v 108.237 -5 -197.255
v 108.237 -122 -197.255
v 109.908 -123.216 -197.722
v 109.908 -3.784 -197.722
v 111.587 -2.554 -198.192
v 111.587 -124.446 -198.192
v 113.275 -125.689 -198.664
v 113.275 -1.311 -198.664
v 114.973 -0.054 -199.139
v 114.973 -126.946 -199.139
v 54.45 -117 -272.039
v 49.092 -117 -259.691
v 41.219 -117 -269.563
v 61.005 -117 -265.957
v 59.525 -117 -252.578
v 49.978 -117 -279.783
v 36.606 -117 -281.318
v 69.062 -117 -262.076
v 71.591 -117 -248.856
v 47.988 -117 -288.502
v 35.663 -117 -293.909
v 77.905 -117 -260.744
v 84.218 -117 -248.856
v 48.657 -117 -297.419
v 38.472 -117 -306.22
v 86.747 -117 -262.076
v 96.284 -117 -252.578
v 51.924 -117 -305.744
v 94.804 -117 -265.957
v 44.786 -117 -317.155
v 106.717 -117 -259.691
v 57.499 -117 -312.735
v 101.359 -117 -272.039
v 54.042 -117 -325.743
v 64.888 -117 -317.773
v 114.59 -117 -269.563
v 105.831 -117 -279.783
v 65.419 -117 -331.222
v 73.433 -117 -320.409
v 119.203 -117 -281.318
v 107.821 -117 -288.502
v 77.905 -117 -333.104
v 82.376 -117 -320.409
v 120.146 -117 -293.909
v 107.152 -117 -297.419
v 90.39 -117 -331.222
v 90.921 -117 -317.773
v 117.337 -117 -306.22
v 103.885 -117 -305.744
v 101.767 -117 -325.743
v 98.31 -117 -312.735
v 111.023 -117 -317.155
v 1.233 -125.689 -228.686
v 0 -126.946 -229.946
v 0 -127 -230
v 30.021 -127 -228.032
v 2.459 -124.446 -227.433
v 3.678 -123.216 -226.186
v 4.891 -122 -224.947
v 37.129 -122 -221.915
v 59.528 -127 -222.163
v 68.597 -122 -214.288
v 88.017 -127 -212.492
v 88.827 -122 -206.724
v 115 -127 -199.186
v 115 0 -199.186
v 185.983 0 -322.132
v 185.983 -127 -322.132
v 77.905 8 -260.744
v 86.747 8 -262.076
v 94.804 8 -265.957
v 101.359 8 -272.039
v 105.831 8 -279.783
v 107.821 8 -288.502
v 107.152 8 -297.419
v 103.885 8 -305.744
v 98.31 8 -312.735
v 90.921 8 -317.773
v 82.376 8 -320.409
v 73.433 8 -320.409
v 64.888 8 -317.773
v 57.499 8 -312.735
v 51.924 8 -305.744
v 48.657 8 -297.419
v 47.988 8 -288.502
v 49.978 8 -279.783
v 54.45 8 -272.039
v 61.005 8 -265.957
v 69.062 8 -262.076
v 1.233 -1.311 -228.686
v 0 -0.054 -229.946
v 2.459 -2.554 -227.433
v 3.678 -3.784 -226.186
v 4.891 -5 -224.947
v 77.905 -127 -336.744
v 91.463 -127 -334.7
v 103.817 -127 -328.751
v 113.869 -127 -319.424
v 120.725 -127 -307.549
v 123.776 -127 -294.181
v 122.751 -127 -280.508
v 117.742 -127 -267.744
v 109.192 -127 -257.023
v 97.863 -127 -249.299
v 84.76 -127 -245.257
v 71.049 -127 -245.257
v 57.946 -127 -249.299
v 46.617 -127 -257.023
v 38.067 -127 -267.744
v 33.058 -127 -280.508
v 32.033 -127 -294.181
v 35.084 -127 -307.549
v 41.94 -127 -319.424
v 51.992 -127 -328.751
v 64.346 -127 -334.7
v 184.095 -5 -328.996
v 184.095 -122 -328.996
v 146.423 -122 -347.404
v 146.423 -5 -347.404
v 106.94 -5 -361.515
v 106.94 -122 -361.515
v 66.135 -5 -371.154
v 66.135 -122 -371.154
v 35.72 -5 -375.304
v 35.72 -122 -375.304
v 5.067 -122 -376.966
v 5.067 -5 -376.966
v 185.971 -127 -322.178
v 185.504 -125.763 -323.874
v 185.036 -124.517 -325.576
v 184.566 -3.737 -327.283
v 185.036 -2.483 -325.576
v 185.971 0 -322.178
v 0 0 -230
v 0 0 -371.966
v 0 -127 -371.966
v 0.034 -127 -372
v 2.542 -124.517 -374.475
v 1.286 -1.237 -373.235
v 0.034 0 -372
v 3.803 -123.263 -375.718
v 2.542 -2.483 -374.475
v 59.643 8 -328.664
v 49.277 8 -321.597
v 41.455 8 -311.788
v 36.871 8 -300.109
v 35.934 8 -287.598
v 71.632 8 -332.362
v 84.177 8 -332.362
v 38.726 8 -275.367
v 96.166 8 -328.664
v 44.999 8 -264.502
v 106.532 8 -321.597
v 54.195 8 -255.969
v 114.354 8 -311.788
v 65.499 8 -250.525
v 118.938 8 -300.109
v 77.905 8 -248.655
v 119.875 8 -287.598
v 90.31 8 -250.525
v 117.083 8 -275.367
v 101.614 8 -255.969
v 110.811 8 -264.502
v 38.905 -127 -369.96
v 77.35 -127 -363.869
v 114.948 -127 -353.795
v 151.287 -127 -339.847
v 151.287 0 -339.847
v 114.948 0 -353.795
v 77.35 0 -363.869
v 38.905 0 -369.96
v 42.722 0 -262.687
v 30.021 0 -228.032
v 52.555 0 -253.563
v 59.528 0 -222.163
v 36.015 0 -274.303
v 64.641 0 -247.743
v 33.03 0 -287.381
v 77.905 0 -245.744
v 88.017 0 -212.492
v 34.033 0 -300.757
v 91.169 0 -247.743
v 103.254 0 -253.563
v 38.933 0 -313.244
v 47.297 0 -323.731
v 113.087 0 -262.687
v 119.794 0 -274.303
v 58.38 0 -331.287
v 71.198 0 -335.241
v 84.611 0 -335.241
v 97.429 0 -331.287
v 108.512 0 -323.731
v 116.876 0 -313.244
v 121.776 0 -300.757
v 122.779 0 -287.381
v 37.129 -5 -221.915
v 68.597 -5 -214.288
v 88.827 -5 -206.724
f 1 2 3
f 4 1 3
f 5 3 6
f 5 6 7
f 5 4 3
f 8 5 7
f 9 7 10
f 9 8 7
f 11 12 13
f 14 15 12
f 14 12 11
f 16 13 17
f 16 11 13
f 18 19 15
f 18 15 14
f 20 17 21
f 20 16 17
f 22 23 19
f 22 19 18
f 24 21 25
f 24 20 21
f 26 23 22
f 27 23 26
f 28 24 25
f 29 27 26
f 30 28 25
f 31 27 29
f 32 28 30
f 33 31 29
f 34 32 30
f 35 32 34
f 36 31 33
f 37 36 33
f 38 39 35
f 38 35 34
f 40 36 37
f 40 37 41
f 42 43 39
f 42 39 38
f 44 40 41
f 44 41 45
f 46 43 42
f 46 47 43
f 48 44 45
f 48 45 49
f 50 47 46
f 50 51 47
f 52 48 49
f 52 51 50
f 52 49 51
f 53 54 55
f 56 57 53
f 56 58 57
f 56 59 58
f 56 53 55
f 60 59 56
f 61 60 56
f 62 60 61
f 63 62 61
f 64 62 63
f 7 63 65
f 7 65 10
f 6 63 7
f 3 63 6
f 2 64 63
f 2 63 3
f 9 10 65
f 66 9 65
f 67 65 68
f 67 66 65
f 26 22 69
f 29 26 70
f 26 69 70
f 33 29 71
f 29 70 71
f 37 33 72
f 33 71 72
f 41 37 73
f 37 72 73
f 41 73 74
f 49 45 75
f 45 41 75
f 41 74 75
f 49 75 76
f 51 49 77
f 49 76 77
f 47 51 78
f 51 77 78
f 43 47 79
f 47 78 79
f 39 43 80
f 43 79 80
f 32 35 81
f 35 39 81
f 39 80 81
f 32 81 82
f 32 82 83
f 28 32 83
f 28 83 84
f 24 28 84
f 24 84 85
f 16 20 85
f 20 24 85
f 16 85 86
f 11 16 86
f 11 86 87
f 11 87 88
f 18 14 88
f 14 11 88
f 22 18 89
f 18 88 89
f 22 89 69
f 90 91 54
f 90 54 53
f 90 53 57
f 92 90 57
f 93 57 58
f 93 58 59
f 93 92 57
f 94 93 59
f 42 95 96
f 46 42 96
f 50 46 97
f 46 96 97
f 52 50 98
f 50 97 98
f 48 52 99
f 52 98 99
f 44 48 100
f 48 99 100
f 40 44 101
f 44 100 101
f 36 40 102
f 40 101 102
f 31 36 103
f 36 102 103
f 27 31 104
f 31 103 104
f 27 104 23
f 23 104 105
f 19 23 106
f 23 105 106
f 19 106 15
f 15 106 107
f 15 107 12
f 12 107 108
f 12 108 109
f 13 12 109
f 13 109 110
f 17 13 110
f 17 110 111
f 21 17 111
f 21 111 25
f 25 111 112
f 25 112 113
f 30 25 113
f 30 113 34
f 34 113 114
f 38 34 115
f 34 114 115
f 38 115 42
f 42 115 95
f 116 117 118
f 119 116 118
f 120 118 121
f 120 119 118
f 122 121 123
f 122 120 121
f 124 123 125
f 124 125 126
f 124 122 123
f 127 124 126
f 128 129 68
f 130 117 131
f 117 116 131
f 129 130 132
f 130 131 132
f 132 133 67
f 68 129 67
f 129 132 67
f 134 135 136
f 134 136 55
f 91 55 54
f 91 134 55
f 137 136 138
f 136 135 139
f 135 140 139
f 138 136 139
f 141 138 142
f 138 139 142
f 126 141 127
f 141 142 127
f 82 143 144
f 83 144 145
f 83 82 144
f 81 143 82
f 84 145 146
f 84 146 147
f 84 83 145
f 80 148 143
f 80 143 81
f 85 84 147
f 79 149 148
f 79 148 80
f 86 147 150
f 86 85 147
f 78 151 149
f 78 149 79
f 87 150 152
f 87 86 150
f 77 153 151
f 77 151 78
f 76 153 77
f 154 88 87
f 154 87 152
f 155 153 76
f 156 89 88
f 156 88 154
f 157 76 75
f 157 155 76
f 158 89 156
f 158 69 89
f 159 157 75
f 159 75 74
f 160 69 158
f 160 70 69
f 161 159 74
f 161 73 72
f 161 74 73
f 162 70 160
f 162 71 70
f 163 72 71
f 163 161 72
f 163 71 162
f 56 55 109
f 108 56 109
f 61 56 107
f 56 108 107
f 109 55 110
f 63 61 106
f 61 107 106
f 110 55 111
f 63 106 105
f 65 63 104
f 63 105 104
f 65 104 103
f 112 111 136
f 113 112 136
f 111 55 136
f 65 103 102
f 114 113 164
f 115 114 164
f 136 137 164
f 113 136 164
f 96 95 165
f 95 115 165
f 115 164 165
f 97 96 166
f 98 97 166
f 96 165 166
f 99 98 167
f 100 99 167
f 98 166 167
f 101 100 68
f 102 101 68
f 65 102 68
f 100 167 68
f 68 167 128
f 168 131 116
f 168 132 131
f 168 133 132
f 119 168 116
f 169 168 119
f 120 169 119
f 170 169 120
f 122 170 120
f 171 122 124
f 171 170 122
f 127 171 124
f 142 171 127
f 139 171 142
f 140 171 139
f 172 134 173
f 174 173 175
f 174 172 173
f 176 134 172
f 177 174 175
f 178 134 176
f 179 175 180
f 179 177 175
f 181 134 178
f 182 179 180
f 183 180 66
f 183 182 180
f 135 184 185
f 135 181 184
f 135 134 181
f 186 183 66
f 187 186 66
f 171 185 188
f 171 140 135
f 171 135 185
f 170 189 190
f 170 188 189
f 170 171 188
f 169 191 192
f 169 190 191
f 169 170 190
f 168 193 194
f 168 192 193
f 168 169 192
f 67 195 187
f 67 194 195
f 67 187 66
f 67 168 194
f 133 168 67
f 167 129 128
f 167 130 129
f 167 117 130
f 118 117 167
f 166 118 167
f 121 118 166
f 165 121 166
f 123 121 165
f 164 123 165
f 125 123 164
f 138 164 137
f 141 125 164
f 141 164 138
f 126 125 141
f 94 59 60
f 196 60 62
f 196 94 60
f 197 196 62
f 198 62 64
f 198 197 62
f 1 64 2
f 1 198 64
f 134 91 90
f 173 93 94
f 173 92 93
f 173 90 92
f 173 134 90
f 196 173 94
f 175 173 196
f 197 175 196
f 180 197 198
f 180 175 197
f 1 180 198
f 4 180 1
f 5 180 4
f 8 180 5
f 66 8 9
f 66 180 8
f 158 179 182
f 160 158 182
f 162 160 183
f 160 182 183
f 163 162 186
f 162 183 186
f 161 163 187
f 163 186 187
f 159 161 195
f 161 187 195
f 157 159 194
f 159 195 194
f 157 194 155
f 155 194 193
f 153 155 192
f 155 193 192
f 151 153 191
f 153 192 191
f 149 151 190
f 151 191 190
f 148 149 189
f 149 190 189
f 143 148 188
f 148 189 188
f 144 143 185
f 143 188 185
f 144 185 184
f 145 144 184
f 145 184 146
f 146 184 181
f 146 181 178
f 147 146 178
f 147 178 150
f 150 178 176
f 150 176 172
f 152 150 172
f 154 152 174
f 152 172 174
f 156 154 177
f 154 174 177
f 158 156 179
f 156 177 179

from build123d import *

# Parameters (mm, degrees)
SKETCH1_R           = 30
BOSS_EXTRUDE1_DEPTH = 127
BOSS_EXTRUDE2_START = 8
SKETCH3_R           = 45
SKETCH3_R_2         = 30
BOSS_EXTRUDE2_DEPTH = 8
CHAMFER1_SIZE2      = 8
CHAMFER1_SIZE       = 2.911761874
CUT_EXTRUDE1_START  = -10
SKETCH4_R           = 46
SKETCH4_R_2         = 30
CUT_EXTRUDE1_DEPTH  = 10
CHAMFER2_SIZE2      = 10
CHAMFER2_SIZE       = 3.639702343


# Some blends are built 0.0001 mm under size
with BuildPart() as part:
    # Sketch1 → Boss-Extrude1 (new body)
    with BuildSketch(Plane(origin=(0, 0, 0), x_dir=(1, 0, 0), z_dir=(0, 1, 0))):
        with BuildLine():
            Line((112.5, 194.855715851), (188.5, 326.491577227))
            ThreePointArc((188.5, 326.491577227), (97.574780004, 364.154036511), (0, 377))
            Line((0, 377), (0, 225))
            ThreePointArc((0, 225), (58.234285148, 217.333310915), (112.5, 194.855715851))
        make_face()
        with Locations(Location((77.904532576, 290.743673713, 0), (0, 0, 270))):
            Circle(SKETCH1_R, mode=Mode.SUBTRACT)
    extrude(amount=-BOSS_EXTRUDE1_DEPTH)

    # Sketch3 → Boss-Extrude2 (add)
    with BuildSketch(Plane(origin=(0, 0, 0), x_dir=(1, 0, 0), z_dir=(0, 1, 0)).offset(BOSS_EXTRUDE2_START)):
        with Locations(Location((77.904532576, 290.743673713, 0), (0, 0, 270))):
            Circle(SKETCH3_R)
        with Locations(Location((77.904532576, 290.743673713, 0), (0, 0, 270))):
            Circle(SKETCH3_R_2, mode=Mode.SUBTRACT)
    extrude(amount=-BOSS_EXTRUDE2_DEPTH)

    # Chamfer1
    chamfer1_edges = [part.edges().sort_by_distance(p)[0] for p in [
        (77.904532576, 8, -335.743673713),
    ]]
    chamfer1_side = [part.faces().sort_by_distance(p)[0] for p in [
        (77.904532576, 8, -335.685438476),
    ]]
    chamfer(chamfer1_edges, length=CHAMFER1_SIZE - 0.0001, length2=CHAMFER1_SIZE2 - 0.0001, reference=chamfer1_side[0])  # a hair under: the kernel refuses the full size

    # Sketch4 → Cut-Extrude1 (cut)
    with BuildSketch(Plane.XZ.offset(127).offset(CUT_EXTRUDE1_START)):
        with Locations(Location((77.904532576, -290.743673713, 0), (0, 0, 270))):
            Circle(SKETCH4_R)
        with Locations(Location((77.904532576, -290.743673713, 0), (0, 0, 90))):
            Circle(SKETCH4_R_2, mode=Mode.SUBTRACT)
    extrude(amount=CUT_EXTRUDE1_DEPTH, mode=Mode.SUBTRACT)

    # Chamfer2
    chamfer2_edges = [part.edges().sort_by_distance(p)[0] for p in [
        (77.904532576, -117, -244.743673713),
    ]]
    chamfer2_side = [part.faces().sort_by_distance(p)[0] for p in [
        (77.904532576, -117, -244.81646776),
    ]]
    chamfer(chamfer2_edges, length=CHAMFER2_SIZE - 0.0001, length2=CHAMFER2_SIZE2 - 0.0001, reference=chamfer2_side[0])  # a hair under: the kernel refuses the full size

    # Chamfer3
    # the kernel refuses this chamfer: 5 mm, written as the material it takes off along each edge
    with BuildSketch(Plane(origin=(0, -127, 0), x_dir=(0.5292424705918727, 0, -0.8484706284379036), z_dir=(0.8484706284379036, 0, 0.5292424705918727))) as chamfer3_piece_1:
        with BuildLine():
            Line((371.858578644, -0.141421356), (377.141421356, 5.141421356))
            Line((377.141421356, 5.141421356), (377.241421356, 5.141421356))
            ThreePointArc((377.241421356, 5.141421356), (377.1, 2.570710678), (377.1, 0))
            Line((377.1, 0), (377, -0.1))
            ThreePointArc((377, -0.1), (374.429289322, -0.1), (371.858578644, -0.241421356))
            Line((371.858578644, -0.241421356), (371.858578644, -0.141421356))
        make_face()
    revolve(axis=Axis((0, -127, 0), (0, 1, 0)), revolution_arc=33.908571791, mode=Mode.SUBTRACT)
    with BuildSketch(Plane(origin=(0, -127, 0), x_dir=(-0.05711995451760951, 0, -0.9983673225801746), z_dir=(-0.9983673225801746, 0, 0.05711995451760951))) as chamfer3_piece_2:
        with BuildLine():
            Line((230.141421356, 0.141421356), (224.858578644, -5.141421356))
            Line((224.858578644, -5.141421356), (224.758578644, -5.141421356))
            ThreePointArc((224.758578644, -5.141421356), (224.9, -2.570710678), (224.9, 0))
            Line((224.9, 0), (225, 0.1))
            ThreePointArc((225, 0.1), (227.570710678, 0.1), (230.141421356, 0.241421356))
            Line((230.141421356, 0.241421356), (230.141421356, 0.141421356))
        make_face()
    revolve(axis=Axis((0, -127, 0), (0, -1, 0)), revolution_arc=36.549029178, mode=Mode.SUBTRACT)
    with BuildSketch(Plane(origin=(0, 0, 0), x_dir=(0.5292424705918727, 0, -0.8484706284379036), z_dir=(0.8484706284379036, 0, 0.5292424705918727))) as chamfer3_piece_3:
        with BuildLine():
            Line((377.141421356, -5.141421356), (371.858578644, 0.141421356))
            Line((371.858578644, 0.141421356), (371.858578644, 0.241421356))
            ThreePointArc((371.858578644, 0.241421356), (374.429289322, 0.1), (377, 0.1))
            Line((377, 0.1), (377.1, 0))
            ThreePointArc((377.1, 0), (377.1, -2.570710678), (377.241421356, -5.141421356))
            Line((377.241421356, -5.141421356), (377.141421356, -5.141421356))
        make_face()
    revolve(axis=Axis((0, 0, 0), (0, 1, 0)), revolution_arc=33.908571791, mode=Mode.SUBTRACT)
    with BuildSketch(Plane(origin=(0, 0, 0), x_dir=(-0.05711995451760943, 0, -0.9983673225801746), z_dir=(-0.9983673225801746, 0, 0.05711995451760943))) as chamfer3_piece_4:
        with BuildLine():
            Line((224.858578644, 5.141421356), (230.141421356, -0.141421356))
            Line((230.141421356, -0.141421356), (230.141421356, -0.241421356))
            ThreePointArc((230.141421356, -0.241421356), (227.570710678, -0.1), (225, -0.1))
            Line((225, -0.1), (224.9, 0))
            ThreePointArc((224.9, 0), (224.9, 2.570710678), (224.758578644, 5.141421356))
            Line((224.758578644, 5.141421356), (224.858578644, 5.141421356))
        make_face()
    revolve(axis=Axis((0, 0, 0), (0, -1, 0)), revolution_arc=36.549029178, mode=Mode.SUBTRACT)
    with BuildSketch(Plane(origin=(0, 12.726295315, -225), x_dir=(-0.027477698296736765, 0, -0.9996224167636066), z_dir=(0, -1, 0))) as chamfer3_piece_5:
        with BuildLine():
            Line((5.090518126, 0), (-0.33429411, 5.023891374))
            Line((-0.33429411, 5.023891374), (-0.434172994, 5.018971161))
            ThreePointArc((-0.434172994, 5.018971161), (-0.183141977, 2.511326919), (-0.099962242, -0.00274777))
            Line((-0.099962242, -0.00274777), (0.00274777, -0.099962242))
            ThreePointArc((0.00274777, -0.099962242), (2.546085101, -0.030050788), (5.093265896, -0.099962242))
            Line((5.093265896, -0.099962242), (5.090518126, 0))
        make_face()
    extrude(amount=152.452590629, mode=Mode.SUBTRACT)
    with BuildSketch(Plane(origin=(0, 13.026648977, -377), x_dir=(-0.0275053668618043, 0, 0.9996216558247413), z_dir=(0, -1, 0))) as chamfer3_piece_6:
        with BuildLine():
            Line((5.176029718, 0), (-0.249663351, -5.204674974))
            Line((-0.249663351, -5.204674974), (-0.349653457, -5.203268263))
            ThreePointArc((-0.349653457, -5.203268263), (-0.162620276, -2.601558906), (-0.099962166, 0.002750537))
            Line((-0.099962166, 0.002750537), (0.002750537, 0.099962166))
            ThreePointArc((0.002750537, 0.099962166), (2.588807445, 0.0288048), (5.178780254, 0.099962166))
            Line((5.178780254, 0.099962166), (5.176029718, 0))
        make_face()
    extrude(amount=153.053297954, mode=Mode.SUBTRACT)
    with BuildSketch(Plane(origin=(188.5, 13.026648977, -326.491577227), x_dir=(-0.8556337629027079, 0, -0.5175817459889334), z_dir=(0, -1, 0))) as chamfer3_piece_7:
        with BuildLine():
            Line((5.210659591, 0), (-0.248004097, -5.170084874))
            Line((-0.248004097, -5.170084874), (-0.347983242, -5.168042668))
            ThreePointArc((-0.347983242, -5.168042668), (-0.152811741, -2.584453961), (-0.099979145, 0.002042206))
            Line((-0.099979145, 0.002042206), (0.002042206, 0.099979145))
            ThreePointArc((0.002042206, 0.099979145), (2.60636271, 0.037782504), (5.214045418, 0.099942664))
            Line((5.214045418, 0.099942664), (5.210659591, 0))
        make_face()
    extrude(amount=153.053297954, mode=Mode.SUBTRACT)
    with BuildSketch(Plane(origin=(112.5, 12.726295315, -194.855715851), x_dir=(-0.8848441204167522, 0, -0.46588719939906503), z_dir=(0, -1, 0))) as chamfer3_piece_8:
        with BuildLine():
            Line((5.0350012, 0), (-0.337980103, 5.0792858))
            Line((-0.337980103, 5.0792858), (-0.437904212, 5.075390609))
            ThreePointArc((-0.437904212, 5.075390609), (-0.199029377, 2.538471922), (-0.099924109, -0.003895191))
            Line((-0.099924109, -0.003895191), (0.003895191, -0.099924109))
            ThreePointArc((0.003895191, -0.099924109), (2.517945165, -0.016000711), (5.036723207, -0.099985172))
            Line((5.036723207, -0.099985172), (5.0350012, 0))
        make_face()
    extrude(amount=152.452590629, mode=Mode.SUBTRACT)


solid = part.part
